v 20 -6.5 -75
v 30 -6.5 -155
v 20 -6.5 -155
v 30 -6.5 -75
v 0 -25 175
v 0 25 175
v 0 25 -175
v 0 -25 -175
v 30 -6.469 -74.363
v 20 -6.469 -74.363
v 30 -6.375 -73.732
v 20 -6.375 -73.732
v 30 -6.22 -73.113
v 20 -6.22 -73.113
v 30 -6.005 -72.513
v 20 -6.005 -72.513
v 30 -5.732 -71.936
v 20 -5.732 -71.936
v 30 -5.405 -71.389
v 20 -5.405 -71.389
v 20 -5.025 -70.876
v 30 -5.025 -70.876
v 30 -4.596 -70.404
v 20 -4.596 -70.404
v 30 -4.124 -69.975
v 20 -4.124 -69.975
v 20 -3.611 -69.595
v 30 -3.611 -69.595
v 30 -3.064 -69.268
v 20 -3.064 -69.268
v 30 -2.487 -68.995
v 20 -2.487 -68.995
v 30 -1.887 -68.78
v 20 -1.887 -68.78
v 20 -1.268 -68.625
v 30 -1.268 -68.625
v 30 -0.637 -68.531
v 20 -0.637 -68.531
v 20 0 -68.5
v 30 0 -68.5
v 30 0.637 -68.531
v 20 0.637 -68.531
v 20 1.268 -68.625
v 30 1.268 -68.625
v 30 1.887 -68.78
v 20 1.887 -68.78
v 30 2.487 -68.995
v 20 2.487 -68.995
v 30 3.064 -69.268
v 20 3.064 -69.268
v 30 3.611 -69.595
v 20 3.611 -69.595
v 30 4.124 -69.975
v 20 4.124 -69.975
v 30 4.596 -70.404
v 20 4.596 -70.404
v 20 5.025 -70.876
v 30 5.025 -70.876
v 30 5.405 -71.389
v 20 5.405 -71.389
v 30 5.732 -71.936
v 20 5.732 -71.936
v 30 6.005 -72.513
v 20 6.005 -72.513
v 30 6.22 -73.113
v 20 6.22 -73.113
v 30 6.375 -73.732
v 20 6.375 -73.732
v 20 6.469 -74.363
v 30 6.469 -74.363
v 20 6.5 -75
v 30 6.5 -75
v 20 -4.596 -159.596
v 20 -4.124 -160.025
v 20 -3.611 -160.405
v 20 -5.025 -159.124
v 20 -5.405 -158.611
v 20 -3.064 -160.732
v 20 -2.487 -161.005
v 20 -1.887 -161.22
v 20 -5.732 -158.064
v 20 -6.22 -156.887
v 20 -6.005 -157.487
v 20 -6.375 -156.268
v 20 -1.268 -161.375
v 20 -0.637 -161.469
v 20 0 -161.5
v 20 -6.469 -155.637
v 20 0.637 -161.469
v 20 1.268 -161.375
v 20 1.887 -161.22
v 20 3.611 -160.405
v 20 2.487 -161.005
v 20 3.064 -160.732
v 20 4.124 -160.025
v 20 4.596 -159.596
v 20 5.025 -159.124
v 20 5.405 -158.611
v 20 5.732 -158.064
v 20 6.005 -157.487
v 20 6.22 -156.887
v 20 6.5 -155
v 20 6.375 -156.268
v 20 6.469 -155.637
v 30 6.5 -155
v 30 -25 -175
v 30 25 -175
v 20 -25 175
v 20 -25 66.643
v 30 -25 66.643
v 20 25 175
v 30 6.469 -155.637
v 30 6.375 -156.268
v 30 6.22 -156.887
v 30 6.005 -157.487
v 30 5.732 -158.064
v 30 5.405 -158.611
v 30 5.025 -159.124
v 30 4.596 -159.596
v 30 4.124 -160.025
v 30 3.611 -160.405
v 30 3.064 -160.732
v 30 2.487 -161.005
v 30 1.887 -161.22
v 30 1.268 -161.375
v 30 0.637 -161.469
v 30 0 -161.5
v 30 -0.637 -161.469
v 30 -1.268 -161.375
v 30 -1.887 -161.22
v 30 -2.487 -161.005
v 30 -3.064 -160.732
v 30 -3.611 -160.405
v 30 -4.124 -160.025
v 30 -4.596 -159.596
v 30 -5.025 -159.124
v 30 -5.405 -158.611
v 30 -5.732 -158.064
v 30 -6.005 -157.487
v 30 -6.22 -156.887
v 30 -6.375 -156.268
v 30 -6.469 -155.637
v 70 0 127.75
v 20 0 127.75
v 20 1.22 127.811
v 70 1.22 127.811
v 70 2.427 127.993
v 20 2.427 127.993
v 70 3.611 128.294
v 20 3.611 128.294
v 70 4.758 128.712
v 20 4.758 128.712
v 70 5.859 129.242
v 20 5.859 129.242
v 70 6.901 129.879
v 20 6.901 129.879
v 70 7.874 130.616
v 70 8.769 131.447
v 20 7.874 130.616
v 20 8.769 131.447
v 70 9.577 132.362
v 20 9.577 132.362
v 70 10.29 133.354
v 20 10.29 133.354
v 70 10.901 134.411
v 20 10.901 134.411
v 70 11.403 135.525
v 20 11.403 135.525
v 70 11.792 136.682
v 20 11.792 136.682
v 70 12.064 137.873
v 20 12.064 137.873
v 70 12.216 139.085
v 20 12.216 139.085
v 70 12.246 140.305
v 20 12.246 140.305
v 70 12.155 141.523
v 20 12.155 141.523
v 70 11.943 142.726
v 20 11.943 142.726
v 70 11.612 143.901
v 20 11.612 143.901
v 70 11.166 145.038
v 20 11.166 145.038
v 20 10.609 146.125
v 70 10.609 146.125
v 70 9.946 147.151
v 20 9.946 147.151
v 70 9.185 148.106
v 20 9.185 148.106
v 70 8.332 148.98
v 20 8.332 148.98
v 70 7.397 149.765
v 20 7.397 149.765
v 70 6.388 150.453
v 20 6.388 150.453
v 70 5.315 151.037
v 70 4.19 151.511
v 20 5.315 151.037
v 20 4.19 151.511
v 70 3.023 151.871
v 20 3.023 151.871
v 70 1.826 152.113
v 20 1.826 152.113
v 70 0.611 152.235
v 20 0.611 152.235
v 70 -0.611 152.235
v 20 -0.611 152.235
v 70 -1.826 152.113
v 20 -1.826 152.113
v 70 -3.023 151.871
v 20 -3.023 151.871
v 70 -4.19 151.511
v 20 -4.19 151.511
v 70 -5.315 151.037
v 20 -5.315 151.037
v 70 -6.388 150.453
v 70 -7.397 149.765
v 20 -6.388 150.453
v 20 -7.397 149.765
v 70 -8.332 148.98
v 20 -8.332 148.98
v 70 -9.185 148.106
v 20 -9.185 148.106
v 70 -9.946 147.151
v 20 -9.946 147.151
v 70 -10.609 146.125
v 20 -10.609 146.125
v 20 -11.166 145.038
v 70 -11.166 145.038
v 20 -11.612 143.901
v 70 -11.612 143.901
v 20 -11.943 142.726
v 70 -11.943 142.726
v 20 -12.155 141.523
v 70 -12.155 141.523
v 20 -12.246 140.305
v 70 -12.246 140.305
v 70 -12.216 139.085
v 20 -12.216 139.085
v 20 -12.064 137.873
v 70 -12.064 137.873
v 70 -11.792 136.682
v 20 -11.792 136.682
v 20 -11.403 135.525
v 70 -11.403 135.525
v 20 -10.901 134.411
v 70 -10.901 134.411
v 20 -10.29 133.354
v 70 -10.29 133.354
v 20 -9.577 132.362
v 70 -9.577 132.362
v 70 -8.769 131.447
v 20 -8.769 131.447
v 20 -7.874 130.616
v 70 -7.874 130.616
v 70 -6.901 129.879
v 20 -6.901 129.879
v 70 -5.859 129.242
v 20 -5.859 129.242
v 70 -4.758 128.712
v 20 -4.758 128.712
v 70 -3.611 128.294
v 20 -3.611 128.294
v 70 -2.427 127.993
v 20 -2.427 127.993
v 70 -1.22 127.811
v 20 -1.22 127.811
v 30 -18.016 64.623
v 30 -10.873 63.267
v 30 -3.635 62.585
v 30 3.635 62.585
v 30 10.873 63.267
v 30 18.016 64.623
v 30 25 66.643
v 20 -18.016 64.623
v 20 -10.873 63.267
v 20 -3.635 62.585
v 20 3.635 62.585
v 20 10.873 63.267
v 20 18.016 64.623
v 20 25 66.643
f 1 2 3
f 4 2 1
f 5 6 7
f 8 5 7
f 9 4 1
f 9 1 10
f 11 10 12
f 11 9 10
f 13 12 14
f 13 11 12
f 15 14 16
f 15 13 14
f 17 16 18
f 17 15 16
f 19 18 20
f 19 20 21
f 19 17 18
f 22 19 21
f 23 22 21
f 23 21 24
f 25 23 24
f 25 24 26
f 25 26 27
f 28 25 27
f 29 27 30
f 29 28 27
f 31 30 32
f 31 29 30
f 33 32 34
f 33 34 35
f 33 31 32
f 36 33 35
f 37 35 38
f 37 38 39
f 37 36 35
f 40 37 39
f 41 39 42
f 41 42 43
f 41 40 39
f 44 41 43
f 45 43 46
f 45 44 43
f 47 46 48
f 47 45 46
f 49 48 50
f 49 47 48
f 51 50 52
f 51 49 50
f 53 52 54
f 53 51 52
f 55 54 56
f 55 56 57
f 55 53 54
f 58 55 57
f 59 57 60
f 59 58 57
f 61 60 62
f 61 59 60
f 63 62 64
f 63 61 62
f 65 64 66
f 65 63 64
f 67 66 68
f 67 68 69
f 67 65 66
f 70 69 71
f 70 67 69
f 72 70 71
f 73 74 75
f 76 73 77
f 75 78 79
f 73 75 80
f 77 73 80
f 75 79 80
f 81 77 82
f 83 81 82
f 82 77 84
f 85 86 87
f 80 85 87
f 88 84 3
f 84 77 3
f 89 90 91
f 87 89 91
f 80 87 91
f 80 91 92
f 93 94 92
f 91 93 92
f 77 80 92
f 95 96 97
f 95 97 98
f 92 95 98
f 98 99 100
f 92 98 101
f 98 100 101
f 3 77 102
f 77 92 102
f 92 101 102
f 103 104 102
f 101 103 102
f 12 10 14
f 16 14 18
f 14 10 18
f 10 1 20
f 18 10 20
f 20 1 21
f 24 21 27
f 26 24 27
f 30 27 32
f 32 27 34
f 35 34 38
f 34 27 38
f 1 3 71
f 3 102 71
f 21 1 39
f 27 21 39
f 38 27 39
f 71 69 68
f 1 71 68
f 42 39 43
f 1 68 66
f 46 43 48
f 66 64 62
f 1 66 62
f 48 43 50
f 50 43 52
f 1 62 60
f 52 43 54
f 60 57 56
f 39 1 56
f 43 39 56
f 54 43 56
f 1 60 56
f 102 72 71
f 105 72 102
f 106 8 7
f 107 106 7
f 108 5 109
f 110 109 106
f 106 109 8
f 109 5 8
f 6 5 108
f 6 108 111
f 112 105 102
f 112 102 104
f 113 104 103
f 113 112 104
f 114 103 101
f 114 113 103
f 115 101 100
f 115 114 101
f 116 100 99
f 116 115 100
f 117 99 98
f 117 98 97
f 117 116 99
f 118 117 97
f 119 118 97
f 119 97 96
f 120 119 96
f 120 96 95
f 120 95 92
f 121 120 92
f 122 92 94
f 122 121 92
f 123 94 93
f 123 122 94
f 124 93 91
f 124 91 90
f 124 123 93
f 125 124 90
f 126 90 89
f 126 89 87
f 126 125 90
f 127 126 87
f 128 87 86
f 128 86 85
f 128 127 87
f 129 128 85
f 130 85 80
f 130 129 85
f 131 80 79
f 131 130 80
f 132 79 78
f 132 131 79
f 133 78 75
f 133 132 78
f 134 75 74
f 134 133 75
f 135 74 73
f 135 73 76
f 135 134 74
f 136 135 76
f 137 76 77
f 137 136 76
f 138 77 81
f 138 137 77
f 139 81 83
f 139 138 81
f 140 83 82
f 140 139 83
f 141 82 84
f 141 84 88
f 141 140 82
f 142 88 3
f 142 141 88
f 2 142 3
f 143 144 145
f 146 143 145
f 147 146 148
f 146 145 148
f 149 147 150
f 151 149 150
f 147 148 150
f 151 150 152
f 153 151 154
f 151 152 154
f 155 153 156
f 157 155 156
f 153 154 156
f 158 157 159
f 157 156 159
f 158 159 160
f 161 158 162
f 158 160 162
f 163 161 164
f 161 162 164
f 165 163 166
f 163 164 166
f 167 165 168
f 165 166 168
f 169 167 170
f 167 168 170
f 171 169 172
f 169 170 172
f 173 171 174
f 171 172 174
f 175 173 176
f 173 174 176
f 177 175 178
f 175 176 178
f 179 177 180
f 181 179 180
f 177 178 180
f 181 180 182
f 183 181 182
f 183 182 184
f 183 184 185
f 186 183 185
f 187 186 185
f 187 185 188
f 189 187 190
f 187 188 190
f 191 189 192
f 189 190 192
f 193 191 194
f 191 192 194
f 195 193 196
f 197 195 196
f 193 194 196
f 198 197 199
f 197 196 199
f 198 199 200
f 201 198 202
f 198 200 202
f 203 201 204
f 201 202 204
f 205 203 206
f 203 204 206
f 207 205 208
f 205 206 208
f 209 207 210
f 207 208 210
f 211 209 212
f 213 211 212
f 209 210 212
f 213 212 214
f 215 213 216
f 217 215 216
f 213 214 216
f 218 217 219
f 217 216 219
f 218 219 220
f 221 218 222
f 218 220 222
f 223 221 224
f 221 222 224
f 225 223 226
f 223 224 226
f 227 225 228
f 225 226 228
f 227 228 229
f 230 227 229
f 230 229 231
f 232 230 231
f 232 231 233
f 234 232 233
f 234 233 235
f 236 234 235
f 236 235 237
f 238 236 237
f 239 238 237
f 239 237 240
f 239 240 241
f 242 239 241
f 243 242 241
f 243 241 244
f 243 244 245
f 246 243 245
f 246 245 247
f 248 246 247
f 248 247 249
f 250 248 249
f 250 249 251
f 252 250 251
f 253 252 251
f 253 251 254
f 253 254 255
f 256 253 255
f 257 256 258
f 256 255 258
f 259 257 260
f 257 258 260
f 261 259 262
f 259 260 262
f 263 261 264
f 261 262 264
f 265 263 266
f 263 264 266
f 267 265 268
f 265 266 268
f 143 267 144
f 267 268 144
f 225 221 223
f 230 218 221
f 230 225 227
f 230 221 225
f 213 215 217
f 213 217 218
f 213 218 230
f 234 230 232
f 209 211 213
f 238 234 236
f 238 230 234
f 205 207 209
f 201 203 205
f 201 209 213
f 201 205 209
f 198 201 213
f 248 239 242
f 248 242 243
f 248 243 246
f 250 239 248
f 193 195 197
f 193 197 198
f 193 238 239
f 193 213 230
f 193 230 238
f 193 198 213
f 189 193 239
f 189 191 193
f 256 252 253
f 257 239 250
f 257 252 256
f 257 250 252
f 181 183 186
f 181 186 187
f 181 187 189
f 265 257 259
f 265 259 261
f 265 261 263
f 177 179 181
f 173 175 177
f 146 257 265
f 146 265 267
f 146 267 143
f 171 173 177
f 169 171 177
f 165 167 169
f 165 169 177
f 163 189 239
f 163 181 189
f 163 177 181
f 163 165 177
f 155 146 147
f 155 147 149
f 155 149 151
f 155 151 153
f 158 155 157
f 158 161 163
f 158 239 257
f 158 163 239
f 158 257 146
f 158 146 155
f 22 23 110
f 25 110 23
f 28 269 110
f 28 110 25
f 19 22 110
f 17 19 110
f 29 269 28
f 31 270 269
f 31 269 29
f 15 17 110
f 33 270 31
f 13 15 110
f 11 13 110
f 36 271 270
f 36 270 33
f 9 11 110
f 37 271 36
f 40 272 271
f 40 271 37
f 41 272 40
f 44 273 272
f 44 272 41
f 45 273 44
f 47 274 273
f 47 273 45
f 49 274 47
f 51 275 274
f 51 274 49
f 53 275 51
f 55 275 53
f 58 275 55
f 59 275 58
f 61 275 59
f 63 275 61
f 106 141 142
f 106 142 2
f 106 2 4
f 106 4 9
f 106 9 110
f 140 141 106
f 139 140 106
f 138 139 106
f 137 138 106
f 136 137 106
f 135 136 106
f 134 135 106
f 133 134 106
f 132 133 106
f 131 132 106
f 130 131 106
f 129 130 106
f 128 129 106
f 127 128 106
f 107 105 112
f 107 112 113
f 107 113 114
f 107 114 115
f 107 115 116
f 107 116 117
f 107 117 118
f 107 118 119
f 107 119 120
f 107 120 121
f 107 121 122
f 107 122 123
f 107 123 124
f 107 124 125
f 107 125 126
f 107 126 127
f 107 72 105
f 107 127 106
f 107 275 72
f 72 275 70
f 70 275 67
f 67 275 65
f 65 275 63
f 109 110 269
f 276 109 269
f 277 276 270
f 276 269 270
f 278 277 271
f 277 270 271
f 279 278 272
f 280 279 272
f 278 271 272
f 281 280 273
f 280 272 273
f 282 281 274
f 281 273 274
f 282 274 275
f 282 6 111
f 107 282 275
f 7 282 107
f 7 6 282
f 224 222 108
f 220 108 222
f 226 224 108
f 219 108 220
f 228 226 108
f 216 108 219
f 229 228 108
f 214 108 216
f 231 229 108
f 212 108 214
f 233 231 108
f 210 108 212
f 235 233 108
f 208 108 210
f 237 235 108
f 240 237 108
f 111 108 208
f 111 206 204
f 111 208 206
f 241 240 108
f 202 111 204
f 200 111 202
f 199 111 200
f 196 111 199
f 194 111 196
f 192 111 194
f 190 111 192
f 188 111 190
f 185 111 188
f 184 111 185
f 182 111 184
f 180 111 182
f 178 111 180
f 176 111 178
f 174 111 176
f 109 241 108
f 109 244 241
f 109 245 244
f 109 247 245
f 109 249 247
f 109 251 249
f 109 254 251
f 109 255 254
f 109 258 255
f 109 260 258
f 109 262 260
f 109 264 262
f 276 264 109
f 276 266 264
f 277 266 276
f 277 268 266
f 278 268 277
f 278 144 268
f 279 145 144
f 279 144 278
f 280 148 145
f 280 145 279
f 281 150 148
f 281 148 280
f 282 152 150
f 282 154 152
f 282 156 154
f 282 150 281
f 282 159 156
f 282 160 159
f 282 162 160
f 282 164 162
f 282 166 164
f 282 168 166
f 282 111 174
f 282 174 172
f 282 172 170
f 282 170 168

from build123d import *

# Parameters (mm, degrees)
SKETCH1_W           = 350
SKETCH1_H           = 50
BOSS_EXTRUDE1_DEPTH = 30
CUT_EXTRUDE1_DEPTH  = 10
SKETCH3_R           = 77.5
CUT_EXTRUDE2_DEPTH  = 10
SKETCH4_R           = 12.25
BOSS_EXTRUDE2_DEPTH = 50


with BuildPart() as part:
    # Sketch1 → Boss-Extrude1 (new body)
    with BuildSketch(Plane(origin=(0, 0, 0), x_dir=(0, 0, -1), z_dir=(1, 0, 0))):
        Rectangle(SKETCH1_W, SKETCH1_H)
    extrude(amount=BOSS_EXTRUDE1_DEPTH)

    # Sketch2 → Cut-Extrude1 (cut)
    with BuildSketch(Plane(origin=(30, 0, 0), x_dir=(0, 0, -1), z_dir=(1, 0, 0))):
        with BuildLine():
            Line((155, -6.5), (75, -6.5))
            ThreePointArc((75, -6.5), (68.5, 0), (75, 6.5))
            Line((75, 6.5), (155, 6.5))
            ThreePointArc((155, 6.5), (161.5, 0), (155, -6.5))
        make_face()
    extrude(amount=-CUT_EXTRUDE1_DEPTH, mode=Mode.SUBTRACT)

    # Sketch3 → Cut-Extrude2 (cut)
    with BuildSketch(Plane(origin=(30, 0, 0), x_dir=(0, 0, -1), z_dir=(1, 0, 0))):
        with Locations((-140, 0)):
            Circle(SKETCH3_R)
    extrude(amount=-CUT_EXTRUDE2_DEPTH, mode=Mode.SUBTRACT)

    # Sketch4 → Boss-Extrude2 (add)
    with BuildSketch(Plane(origin=(20, 0, 0), x_dir=(0, 0, -1), z_dir=(1, 0, 0))):
        with Locations((-140, 0)):
            Circle(SKETCH4_R)
    extrude(amount=BOSS_EXTRUDE2_DEPTH)


solid = part.part
